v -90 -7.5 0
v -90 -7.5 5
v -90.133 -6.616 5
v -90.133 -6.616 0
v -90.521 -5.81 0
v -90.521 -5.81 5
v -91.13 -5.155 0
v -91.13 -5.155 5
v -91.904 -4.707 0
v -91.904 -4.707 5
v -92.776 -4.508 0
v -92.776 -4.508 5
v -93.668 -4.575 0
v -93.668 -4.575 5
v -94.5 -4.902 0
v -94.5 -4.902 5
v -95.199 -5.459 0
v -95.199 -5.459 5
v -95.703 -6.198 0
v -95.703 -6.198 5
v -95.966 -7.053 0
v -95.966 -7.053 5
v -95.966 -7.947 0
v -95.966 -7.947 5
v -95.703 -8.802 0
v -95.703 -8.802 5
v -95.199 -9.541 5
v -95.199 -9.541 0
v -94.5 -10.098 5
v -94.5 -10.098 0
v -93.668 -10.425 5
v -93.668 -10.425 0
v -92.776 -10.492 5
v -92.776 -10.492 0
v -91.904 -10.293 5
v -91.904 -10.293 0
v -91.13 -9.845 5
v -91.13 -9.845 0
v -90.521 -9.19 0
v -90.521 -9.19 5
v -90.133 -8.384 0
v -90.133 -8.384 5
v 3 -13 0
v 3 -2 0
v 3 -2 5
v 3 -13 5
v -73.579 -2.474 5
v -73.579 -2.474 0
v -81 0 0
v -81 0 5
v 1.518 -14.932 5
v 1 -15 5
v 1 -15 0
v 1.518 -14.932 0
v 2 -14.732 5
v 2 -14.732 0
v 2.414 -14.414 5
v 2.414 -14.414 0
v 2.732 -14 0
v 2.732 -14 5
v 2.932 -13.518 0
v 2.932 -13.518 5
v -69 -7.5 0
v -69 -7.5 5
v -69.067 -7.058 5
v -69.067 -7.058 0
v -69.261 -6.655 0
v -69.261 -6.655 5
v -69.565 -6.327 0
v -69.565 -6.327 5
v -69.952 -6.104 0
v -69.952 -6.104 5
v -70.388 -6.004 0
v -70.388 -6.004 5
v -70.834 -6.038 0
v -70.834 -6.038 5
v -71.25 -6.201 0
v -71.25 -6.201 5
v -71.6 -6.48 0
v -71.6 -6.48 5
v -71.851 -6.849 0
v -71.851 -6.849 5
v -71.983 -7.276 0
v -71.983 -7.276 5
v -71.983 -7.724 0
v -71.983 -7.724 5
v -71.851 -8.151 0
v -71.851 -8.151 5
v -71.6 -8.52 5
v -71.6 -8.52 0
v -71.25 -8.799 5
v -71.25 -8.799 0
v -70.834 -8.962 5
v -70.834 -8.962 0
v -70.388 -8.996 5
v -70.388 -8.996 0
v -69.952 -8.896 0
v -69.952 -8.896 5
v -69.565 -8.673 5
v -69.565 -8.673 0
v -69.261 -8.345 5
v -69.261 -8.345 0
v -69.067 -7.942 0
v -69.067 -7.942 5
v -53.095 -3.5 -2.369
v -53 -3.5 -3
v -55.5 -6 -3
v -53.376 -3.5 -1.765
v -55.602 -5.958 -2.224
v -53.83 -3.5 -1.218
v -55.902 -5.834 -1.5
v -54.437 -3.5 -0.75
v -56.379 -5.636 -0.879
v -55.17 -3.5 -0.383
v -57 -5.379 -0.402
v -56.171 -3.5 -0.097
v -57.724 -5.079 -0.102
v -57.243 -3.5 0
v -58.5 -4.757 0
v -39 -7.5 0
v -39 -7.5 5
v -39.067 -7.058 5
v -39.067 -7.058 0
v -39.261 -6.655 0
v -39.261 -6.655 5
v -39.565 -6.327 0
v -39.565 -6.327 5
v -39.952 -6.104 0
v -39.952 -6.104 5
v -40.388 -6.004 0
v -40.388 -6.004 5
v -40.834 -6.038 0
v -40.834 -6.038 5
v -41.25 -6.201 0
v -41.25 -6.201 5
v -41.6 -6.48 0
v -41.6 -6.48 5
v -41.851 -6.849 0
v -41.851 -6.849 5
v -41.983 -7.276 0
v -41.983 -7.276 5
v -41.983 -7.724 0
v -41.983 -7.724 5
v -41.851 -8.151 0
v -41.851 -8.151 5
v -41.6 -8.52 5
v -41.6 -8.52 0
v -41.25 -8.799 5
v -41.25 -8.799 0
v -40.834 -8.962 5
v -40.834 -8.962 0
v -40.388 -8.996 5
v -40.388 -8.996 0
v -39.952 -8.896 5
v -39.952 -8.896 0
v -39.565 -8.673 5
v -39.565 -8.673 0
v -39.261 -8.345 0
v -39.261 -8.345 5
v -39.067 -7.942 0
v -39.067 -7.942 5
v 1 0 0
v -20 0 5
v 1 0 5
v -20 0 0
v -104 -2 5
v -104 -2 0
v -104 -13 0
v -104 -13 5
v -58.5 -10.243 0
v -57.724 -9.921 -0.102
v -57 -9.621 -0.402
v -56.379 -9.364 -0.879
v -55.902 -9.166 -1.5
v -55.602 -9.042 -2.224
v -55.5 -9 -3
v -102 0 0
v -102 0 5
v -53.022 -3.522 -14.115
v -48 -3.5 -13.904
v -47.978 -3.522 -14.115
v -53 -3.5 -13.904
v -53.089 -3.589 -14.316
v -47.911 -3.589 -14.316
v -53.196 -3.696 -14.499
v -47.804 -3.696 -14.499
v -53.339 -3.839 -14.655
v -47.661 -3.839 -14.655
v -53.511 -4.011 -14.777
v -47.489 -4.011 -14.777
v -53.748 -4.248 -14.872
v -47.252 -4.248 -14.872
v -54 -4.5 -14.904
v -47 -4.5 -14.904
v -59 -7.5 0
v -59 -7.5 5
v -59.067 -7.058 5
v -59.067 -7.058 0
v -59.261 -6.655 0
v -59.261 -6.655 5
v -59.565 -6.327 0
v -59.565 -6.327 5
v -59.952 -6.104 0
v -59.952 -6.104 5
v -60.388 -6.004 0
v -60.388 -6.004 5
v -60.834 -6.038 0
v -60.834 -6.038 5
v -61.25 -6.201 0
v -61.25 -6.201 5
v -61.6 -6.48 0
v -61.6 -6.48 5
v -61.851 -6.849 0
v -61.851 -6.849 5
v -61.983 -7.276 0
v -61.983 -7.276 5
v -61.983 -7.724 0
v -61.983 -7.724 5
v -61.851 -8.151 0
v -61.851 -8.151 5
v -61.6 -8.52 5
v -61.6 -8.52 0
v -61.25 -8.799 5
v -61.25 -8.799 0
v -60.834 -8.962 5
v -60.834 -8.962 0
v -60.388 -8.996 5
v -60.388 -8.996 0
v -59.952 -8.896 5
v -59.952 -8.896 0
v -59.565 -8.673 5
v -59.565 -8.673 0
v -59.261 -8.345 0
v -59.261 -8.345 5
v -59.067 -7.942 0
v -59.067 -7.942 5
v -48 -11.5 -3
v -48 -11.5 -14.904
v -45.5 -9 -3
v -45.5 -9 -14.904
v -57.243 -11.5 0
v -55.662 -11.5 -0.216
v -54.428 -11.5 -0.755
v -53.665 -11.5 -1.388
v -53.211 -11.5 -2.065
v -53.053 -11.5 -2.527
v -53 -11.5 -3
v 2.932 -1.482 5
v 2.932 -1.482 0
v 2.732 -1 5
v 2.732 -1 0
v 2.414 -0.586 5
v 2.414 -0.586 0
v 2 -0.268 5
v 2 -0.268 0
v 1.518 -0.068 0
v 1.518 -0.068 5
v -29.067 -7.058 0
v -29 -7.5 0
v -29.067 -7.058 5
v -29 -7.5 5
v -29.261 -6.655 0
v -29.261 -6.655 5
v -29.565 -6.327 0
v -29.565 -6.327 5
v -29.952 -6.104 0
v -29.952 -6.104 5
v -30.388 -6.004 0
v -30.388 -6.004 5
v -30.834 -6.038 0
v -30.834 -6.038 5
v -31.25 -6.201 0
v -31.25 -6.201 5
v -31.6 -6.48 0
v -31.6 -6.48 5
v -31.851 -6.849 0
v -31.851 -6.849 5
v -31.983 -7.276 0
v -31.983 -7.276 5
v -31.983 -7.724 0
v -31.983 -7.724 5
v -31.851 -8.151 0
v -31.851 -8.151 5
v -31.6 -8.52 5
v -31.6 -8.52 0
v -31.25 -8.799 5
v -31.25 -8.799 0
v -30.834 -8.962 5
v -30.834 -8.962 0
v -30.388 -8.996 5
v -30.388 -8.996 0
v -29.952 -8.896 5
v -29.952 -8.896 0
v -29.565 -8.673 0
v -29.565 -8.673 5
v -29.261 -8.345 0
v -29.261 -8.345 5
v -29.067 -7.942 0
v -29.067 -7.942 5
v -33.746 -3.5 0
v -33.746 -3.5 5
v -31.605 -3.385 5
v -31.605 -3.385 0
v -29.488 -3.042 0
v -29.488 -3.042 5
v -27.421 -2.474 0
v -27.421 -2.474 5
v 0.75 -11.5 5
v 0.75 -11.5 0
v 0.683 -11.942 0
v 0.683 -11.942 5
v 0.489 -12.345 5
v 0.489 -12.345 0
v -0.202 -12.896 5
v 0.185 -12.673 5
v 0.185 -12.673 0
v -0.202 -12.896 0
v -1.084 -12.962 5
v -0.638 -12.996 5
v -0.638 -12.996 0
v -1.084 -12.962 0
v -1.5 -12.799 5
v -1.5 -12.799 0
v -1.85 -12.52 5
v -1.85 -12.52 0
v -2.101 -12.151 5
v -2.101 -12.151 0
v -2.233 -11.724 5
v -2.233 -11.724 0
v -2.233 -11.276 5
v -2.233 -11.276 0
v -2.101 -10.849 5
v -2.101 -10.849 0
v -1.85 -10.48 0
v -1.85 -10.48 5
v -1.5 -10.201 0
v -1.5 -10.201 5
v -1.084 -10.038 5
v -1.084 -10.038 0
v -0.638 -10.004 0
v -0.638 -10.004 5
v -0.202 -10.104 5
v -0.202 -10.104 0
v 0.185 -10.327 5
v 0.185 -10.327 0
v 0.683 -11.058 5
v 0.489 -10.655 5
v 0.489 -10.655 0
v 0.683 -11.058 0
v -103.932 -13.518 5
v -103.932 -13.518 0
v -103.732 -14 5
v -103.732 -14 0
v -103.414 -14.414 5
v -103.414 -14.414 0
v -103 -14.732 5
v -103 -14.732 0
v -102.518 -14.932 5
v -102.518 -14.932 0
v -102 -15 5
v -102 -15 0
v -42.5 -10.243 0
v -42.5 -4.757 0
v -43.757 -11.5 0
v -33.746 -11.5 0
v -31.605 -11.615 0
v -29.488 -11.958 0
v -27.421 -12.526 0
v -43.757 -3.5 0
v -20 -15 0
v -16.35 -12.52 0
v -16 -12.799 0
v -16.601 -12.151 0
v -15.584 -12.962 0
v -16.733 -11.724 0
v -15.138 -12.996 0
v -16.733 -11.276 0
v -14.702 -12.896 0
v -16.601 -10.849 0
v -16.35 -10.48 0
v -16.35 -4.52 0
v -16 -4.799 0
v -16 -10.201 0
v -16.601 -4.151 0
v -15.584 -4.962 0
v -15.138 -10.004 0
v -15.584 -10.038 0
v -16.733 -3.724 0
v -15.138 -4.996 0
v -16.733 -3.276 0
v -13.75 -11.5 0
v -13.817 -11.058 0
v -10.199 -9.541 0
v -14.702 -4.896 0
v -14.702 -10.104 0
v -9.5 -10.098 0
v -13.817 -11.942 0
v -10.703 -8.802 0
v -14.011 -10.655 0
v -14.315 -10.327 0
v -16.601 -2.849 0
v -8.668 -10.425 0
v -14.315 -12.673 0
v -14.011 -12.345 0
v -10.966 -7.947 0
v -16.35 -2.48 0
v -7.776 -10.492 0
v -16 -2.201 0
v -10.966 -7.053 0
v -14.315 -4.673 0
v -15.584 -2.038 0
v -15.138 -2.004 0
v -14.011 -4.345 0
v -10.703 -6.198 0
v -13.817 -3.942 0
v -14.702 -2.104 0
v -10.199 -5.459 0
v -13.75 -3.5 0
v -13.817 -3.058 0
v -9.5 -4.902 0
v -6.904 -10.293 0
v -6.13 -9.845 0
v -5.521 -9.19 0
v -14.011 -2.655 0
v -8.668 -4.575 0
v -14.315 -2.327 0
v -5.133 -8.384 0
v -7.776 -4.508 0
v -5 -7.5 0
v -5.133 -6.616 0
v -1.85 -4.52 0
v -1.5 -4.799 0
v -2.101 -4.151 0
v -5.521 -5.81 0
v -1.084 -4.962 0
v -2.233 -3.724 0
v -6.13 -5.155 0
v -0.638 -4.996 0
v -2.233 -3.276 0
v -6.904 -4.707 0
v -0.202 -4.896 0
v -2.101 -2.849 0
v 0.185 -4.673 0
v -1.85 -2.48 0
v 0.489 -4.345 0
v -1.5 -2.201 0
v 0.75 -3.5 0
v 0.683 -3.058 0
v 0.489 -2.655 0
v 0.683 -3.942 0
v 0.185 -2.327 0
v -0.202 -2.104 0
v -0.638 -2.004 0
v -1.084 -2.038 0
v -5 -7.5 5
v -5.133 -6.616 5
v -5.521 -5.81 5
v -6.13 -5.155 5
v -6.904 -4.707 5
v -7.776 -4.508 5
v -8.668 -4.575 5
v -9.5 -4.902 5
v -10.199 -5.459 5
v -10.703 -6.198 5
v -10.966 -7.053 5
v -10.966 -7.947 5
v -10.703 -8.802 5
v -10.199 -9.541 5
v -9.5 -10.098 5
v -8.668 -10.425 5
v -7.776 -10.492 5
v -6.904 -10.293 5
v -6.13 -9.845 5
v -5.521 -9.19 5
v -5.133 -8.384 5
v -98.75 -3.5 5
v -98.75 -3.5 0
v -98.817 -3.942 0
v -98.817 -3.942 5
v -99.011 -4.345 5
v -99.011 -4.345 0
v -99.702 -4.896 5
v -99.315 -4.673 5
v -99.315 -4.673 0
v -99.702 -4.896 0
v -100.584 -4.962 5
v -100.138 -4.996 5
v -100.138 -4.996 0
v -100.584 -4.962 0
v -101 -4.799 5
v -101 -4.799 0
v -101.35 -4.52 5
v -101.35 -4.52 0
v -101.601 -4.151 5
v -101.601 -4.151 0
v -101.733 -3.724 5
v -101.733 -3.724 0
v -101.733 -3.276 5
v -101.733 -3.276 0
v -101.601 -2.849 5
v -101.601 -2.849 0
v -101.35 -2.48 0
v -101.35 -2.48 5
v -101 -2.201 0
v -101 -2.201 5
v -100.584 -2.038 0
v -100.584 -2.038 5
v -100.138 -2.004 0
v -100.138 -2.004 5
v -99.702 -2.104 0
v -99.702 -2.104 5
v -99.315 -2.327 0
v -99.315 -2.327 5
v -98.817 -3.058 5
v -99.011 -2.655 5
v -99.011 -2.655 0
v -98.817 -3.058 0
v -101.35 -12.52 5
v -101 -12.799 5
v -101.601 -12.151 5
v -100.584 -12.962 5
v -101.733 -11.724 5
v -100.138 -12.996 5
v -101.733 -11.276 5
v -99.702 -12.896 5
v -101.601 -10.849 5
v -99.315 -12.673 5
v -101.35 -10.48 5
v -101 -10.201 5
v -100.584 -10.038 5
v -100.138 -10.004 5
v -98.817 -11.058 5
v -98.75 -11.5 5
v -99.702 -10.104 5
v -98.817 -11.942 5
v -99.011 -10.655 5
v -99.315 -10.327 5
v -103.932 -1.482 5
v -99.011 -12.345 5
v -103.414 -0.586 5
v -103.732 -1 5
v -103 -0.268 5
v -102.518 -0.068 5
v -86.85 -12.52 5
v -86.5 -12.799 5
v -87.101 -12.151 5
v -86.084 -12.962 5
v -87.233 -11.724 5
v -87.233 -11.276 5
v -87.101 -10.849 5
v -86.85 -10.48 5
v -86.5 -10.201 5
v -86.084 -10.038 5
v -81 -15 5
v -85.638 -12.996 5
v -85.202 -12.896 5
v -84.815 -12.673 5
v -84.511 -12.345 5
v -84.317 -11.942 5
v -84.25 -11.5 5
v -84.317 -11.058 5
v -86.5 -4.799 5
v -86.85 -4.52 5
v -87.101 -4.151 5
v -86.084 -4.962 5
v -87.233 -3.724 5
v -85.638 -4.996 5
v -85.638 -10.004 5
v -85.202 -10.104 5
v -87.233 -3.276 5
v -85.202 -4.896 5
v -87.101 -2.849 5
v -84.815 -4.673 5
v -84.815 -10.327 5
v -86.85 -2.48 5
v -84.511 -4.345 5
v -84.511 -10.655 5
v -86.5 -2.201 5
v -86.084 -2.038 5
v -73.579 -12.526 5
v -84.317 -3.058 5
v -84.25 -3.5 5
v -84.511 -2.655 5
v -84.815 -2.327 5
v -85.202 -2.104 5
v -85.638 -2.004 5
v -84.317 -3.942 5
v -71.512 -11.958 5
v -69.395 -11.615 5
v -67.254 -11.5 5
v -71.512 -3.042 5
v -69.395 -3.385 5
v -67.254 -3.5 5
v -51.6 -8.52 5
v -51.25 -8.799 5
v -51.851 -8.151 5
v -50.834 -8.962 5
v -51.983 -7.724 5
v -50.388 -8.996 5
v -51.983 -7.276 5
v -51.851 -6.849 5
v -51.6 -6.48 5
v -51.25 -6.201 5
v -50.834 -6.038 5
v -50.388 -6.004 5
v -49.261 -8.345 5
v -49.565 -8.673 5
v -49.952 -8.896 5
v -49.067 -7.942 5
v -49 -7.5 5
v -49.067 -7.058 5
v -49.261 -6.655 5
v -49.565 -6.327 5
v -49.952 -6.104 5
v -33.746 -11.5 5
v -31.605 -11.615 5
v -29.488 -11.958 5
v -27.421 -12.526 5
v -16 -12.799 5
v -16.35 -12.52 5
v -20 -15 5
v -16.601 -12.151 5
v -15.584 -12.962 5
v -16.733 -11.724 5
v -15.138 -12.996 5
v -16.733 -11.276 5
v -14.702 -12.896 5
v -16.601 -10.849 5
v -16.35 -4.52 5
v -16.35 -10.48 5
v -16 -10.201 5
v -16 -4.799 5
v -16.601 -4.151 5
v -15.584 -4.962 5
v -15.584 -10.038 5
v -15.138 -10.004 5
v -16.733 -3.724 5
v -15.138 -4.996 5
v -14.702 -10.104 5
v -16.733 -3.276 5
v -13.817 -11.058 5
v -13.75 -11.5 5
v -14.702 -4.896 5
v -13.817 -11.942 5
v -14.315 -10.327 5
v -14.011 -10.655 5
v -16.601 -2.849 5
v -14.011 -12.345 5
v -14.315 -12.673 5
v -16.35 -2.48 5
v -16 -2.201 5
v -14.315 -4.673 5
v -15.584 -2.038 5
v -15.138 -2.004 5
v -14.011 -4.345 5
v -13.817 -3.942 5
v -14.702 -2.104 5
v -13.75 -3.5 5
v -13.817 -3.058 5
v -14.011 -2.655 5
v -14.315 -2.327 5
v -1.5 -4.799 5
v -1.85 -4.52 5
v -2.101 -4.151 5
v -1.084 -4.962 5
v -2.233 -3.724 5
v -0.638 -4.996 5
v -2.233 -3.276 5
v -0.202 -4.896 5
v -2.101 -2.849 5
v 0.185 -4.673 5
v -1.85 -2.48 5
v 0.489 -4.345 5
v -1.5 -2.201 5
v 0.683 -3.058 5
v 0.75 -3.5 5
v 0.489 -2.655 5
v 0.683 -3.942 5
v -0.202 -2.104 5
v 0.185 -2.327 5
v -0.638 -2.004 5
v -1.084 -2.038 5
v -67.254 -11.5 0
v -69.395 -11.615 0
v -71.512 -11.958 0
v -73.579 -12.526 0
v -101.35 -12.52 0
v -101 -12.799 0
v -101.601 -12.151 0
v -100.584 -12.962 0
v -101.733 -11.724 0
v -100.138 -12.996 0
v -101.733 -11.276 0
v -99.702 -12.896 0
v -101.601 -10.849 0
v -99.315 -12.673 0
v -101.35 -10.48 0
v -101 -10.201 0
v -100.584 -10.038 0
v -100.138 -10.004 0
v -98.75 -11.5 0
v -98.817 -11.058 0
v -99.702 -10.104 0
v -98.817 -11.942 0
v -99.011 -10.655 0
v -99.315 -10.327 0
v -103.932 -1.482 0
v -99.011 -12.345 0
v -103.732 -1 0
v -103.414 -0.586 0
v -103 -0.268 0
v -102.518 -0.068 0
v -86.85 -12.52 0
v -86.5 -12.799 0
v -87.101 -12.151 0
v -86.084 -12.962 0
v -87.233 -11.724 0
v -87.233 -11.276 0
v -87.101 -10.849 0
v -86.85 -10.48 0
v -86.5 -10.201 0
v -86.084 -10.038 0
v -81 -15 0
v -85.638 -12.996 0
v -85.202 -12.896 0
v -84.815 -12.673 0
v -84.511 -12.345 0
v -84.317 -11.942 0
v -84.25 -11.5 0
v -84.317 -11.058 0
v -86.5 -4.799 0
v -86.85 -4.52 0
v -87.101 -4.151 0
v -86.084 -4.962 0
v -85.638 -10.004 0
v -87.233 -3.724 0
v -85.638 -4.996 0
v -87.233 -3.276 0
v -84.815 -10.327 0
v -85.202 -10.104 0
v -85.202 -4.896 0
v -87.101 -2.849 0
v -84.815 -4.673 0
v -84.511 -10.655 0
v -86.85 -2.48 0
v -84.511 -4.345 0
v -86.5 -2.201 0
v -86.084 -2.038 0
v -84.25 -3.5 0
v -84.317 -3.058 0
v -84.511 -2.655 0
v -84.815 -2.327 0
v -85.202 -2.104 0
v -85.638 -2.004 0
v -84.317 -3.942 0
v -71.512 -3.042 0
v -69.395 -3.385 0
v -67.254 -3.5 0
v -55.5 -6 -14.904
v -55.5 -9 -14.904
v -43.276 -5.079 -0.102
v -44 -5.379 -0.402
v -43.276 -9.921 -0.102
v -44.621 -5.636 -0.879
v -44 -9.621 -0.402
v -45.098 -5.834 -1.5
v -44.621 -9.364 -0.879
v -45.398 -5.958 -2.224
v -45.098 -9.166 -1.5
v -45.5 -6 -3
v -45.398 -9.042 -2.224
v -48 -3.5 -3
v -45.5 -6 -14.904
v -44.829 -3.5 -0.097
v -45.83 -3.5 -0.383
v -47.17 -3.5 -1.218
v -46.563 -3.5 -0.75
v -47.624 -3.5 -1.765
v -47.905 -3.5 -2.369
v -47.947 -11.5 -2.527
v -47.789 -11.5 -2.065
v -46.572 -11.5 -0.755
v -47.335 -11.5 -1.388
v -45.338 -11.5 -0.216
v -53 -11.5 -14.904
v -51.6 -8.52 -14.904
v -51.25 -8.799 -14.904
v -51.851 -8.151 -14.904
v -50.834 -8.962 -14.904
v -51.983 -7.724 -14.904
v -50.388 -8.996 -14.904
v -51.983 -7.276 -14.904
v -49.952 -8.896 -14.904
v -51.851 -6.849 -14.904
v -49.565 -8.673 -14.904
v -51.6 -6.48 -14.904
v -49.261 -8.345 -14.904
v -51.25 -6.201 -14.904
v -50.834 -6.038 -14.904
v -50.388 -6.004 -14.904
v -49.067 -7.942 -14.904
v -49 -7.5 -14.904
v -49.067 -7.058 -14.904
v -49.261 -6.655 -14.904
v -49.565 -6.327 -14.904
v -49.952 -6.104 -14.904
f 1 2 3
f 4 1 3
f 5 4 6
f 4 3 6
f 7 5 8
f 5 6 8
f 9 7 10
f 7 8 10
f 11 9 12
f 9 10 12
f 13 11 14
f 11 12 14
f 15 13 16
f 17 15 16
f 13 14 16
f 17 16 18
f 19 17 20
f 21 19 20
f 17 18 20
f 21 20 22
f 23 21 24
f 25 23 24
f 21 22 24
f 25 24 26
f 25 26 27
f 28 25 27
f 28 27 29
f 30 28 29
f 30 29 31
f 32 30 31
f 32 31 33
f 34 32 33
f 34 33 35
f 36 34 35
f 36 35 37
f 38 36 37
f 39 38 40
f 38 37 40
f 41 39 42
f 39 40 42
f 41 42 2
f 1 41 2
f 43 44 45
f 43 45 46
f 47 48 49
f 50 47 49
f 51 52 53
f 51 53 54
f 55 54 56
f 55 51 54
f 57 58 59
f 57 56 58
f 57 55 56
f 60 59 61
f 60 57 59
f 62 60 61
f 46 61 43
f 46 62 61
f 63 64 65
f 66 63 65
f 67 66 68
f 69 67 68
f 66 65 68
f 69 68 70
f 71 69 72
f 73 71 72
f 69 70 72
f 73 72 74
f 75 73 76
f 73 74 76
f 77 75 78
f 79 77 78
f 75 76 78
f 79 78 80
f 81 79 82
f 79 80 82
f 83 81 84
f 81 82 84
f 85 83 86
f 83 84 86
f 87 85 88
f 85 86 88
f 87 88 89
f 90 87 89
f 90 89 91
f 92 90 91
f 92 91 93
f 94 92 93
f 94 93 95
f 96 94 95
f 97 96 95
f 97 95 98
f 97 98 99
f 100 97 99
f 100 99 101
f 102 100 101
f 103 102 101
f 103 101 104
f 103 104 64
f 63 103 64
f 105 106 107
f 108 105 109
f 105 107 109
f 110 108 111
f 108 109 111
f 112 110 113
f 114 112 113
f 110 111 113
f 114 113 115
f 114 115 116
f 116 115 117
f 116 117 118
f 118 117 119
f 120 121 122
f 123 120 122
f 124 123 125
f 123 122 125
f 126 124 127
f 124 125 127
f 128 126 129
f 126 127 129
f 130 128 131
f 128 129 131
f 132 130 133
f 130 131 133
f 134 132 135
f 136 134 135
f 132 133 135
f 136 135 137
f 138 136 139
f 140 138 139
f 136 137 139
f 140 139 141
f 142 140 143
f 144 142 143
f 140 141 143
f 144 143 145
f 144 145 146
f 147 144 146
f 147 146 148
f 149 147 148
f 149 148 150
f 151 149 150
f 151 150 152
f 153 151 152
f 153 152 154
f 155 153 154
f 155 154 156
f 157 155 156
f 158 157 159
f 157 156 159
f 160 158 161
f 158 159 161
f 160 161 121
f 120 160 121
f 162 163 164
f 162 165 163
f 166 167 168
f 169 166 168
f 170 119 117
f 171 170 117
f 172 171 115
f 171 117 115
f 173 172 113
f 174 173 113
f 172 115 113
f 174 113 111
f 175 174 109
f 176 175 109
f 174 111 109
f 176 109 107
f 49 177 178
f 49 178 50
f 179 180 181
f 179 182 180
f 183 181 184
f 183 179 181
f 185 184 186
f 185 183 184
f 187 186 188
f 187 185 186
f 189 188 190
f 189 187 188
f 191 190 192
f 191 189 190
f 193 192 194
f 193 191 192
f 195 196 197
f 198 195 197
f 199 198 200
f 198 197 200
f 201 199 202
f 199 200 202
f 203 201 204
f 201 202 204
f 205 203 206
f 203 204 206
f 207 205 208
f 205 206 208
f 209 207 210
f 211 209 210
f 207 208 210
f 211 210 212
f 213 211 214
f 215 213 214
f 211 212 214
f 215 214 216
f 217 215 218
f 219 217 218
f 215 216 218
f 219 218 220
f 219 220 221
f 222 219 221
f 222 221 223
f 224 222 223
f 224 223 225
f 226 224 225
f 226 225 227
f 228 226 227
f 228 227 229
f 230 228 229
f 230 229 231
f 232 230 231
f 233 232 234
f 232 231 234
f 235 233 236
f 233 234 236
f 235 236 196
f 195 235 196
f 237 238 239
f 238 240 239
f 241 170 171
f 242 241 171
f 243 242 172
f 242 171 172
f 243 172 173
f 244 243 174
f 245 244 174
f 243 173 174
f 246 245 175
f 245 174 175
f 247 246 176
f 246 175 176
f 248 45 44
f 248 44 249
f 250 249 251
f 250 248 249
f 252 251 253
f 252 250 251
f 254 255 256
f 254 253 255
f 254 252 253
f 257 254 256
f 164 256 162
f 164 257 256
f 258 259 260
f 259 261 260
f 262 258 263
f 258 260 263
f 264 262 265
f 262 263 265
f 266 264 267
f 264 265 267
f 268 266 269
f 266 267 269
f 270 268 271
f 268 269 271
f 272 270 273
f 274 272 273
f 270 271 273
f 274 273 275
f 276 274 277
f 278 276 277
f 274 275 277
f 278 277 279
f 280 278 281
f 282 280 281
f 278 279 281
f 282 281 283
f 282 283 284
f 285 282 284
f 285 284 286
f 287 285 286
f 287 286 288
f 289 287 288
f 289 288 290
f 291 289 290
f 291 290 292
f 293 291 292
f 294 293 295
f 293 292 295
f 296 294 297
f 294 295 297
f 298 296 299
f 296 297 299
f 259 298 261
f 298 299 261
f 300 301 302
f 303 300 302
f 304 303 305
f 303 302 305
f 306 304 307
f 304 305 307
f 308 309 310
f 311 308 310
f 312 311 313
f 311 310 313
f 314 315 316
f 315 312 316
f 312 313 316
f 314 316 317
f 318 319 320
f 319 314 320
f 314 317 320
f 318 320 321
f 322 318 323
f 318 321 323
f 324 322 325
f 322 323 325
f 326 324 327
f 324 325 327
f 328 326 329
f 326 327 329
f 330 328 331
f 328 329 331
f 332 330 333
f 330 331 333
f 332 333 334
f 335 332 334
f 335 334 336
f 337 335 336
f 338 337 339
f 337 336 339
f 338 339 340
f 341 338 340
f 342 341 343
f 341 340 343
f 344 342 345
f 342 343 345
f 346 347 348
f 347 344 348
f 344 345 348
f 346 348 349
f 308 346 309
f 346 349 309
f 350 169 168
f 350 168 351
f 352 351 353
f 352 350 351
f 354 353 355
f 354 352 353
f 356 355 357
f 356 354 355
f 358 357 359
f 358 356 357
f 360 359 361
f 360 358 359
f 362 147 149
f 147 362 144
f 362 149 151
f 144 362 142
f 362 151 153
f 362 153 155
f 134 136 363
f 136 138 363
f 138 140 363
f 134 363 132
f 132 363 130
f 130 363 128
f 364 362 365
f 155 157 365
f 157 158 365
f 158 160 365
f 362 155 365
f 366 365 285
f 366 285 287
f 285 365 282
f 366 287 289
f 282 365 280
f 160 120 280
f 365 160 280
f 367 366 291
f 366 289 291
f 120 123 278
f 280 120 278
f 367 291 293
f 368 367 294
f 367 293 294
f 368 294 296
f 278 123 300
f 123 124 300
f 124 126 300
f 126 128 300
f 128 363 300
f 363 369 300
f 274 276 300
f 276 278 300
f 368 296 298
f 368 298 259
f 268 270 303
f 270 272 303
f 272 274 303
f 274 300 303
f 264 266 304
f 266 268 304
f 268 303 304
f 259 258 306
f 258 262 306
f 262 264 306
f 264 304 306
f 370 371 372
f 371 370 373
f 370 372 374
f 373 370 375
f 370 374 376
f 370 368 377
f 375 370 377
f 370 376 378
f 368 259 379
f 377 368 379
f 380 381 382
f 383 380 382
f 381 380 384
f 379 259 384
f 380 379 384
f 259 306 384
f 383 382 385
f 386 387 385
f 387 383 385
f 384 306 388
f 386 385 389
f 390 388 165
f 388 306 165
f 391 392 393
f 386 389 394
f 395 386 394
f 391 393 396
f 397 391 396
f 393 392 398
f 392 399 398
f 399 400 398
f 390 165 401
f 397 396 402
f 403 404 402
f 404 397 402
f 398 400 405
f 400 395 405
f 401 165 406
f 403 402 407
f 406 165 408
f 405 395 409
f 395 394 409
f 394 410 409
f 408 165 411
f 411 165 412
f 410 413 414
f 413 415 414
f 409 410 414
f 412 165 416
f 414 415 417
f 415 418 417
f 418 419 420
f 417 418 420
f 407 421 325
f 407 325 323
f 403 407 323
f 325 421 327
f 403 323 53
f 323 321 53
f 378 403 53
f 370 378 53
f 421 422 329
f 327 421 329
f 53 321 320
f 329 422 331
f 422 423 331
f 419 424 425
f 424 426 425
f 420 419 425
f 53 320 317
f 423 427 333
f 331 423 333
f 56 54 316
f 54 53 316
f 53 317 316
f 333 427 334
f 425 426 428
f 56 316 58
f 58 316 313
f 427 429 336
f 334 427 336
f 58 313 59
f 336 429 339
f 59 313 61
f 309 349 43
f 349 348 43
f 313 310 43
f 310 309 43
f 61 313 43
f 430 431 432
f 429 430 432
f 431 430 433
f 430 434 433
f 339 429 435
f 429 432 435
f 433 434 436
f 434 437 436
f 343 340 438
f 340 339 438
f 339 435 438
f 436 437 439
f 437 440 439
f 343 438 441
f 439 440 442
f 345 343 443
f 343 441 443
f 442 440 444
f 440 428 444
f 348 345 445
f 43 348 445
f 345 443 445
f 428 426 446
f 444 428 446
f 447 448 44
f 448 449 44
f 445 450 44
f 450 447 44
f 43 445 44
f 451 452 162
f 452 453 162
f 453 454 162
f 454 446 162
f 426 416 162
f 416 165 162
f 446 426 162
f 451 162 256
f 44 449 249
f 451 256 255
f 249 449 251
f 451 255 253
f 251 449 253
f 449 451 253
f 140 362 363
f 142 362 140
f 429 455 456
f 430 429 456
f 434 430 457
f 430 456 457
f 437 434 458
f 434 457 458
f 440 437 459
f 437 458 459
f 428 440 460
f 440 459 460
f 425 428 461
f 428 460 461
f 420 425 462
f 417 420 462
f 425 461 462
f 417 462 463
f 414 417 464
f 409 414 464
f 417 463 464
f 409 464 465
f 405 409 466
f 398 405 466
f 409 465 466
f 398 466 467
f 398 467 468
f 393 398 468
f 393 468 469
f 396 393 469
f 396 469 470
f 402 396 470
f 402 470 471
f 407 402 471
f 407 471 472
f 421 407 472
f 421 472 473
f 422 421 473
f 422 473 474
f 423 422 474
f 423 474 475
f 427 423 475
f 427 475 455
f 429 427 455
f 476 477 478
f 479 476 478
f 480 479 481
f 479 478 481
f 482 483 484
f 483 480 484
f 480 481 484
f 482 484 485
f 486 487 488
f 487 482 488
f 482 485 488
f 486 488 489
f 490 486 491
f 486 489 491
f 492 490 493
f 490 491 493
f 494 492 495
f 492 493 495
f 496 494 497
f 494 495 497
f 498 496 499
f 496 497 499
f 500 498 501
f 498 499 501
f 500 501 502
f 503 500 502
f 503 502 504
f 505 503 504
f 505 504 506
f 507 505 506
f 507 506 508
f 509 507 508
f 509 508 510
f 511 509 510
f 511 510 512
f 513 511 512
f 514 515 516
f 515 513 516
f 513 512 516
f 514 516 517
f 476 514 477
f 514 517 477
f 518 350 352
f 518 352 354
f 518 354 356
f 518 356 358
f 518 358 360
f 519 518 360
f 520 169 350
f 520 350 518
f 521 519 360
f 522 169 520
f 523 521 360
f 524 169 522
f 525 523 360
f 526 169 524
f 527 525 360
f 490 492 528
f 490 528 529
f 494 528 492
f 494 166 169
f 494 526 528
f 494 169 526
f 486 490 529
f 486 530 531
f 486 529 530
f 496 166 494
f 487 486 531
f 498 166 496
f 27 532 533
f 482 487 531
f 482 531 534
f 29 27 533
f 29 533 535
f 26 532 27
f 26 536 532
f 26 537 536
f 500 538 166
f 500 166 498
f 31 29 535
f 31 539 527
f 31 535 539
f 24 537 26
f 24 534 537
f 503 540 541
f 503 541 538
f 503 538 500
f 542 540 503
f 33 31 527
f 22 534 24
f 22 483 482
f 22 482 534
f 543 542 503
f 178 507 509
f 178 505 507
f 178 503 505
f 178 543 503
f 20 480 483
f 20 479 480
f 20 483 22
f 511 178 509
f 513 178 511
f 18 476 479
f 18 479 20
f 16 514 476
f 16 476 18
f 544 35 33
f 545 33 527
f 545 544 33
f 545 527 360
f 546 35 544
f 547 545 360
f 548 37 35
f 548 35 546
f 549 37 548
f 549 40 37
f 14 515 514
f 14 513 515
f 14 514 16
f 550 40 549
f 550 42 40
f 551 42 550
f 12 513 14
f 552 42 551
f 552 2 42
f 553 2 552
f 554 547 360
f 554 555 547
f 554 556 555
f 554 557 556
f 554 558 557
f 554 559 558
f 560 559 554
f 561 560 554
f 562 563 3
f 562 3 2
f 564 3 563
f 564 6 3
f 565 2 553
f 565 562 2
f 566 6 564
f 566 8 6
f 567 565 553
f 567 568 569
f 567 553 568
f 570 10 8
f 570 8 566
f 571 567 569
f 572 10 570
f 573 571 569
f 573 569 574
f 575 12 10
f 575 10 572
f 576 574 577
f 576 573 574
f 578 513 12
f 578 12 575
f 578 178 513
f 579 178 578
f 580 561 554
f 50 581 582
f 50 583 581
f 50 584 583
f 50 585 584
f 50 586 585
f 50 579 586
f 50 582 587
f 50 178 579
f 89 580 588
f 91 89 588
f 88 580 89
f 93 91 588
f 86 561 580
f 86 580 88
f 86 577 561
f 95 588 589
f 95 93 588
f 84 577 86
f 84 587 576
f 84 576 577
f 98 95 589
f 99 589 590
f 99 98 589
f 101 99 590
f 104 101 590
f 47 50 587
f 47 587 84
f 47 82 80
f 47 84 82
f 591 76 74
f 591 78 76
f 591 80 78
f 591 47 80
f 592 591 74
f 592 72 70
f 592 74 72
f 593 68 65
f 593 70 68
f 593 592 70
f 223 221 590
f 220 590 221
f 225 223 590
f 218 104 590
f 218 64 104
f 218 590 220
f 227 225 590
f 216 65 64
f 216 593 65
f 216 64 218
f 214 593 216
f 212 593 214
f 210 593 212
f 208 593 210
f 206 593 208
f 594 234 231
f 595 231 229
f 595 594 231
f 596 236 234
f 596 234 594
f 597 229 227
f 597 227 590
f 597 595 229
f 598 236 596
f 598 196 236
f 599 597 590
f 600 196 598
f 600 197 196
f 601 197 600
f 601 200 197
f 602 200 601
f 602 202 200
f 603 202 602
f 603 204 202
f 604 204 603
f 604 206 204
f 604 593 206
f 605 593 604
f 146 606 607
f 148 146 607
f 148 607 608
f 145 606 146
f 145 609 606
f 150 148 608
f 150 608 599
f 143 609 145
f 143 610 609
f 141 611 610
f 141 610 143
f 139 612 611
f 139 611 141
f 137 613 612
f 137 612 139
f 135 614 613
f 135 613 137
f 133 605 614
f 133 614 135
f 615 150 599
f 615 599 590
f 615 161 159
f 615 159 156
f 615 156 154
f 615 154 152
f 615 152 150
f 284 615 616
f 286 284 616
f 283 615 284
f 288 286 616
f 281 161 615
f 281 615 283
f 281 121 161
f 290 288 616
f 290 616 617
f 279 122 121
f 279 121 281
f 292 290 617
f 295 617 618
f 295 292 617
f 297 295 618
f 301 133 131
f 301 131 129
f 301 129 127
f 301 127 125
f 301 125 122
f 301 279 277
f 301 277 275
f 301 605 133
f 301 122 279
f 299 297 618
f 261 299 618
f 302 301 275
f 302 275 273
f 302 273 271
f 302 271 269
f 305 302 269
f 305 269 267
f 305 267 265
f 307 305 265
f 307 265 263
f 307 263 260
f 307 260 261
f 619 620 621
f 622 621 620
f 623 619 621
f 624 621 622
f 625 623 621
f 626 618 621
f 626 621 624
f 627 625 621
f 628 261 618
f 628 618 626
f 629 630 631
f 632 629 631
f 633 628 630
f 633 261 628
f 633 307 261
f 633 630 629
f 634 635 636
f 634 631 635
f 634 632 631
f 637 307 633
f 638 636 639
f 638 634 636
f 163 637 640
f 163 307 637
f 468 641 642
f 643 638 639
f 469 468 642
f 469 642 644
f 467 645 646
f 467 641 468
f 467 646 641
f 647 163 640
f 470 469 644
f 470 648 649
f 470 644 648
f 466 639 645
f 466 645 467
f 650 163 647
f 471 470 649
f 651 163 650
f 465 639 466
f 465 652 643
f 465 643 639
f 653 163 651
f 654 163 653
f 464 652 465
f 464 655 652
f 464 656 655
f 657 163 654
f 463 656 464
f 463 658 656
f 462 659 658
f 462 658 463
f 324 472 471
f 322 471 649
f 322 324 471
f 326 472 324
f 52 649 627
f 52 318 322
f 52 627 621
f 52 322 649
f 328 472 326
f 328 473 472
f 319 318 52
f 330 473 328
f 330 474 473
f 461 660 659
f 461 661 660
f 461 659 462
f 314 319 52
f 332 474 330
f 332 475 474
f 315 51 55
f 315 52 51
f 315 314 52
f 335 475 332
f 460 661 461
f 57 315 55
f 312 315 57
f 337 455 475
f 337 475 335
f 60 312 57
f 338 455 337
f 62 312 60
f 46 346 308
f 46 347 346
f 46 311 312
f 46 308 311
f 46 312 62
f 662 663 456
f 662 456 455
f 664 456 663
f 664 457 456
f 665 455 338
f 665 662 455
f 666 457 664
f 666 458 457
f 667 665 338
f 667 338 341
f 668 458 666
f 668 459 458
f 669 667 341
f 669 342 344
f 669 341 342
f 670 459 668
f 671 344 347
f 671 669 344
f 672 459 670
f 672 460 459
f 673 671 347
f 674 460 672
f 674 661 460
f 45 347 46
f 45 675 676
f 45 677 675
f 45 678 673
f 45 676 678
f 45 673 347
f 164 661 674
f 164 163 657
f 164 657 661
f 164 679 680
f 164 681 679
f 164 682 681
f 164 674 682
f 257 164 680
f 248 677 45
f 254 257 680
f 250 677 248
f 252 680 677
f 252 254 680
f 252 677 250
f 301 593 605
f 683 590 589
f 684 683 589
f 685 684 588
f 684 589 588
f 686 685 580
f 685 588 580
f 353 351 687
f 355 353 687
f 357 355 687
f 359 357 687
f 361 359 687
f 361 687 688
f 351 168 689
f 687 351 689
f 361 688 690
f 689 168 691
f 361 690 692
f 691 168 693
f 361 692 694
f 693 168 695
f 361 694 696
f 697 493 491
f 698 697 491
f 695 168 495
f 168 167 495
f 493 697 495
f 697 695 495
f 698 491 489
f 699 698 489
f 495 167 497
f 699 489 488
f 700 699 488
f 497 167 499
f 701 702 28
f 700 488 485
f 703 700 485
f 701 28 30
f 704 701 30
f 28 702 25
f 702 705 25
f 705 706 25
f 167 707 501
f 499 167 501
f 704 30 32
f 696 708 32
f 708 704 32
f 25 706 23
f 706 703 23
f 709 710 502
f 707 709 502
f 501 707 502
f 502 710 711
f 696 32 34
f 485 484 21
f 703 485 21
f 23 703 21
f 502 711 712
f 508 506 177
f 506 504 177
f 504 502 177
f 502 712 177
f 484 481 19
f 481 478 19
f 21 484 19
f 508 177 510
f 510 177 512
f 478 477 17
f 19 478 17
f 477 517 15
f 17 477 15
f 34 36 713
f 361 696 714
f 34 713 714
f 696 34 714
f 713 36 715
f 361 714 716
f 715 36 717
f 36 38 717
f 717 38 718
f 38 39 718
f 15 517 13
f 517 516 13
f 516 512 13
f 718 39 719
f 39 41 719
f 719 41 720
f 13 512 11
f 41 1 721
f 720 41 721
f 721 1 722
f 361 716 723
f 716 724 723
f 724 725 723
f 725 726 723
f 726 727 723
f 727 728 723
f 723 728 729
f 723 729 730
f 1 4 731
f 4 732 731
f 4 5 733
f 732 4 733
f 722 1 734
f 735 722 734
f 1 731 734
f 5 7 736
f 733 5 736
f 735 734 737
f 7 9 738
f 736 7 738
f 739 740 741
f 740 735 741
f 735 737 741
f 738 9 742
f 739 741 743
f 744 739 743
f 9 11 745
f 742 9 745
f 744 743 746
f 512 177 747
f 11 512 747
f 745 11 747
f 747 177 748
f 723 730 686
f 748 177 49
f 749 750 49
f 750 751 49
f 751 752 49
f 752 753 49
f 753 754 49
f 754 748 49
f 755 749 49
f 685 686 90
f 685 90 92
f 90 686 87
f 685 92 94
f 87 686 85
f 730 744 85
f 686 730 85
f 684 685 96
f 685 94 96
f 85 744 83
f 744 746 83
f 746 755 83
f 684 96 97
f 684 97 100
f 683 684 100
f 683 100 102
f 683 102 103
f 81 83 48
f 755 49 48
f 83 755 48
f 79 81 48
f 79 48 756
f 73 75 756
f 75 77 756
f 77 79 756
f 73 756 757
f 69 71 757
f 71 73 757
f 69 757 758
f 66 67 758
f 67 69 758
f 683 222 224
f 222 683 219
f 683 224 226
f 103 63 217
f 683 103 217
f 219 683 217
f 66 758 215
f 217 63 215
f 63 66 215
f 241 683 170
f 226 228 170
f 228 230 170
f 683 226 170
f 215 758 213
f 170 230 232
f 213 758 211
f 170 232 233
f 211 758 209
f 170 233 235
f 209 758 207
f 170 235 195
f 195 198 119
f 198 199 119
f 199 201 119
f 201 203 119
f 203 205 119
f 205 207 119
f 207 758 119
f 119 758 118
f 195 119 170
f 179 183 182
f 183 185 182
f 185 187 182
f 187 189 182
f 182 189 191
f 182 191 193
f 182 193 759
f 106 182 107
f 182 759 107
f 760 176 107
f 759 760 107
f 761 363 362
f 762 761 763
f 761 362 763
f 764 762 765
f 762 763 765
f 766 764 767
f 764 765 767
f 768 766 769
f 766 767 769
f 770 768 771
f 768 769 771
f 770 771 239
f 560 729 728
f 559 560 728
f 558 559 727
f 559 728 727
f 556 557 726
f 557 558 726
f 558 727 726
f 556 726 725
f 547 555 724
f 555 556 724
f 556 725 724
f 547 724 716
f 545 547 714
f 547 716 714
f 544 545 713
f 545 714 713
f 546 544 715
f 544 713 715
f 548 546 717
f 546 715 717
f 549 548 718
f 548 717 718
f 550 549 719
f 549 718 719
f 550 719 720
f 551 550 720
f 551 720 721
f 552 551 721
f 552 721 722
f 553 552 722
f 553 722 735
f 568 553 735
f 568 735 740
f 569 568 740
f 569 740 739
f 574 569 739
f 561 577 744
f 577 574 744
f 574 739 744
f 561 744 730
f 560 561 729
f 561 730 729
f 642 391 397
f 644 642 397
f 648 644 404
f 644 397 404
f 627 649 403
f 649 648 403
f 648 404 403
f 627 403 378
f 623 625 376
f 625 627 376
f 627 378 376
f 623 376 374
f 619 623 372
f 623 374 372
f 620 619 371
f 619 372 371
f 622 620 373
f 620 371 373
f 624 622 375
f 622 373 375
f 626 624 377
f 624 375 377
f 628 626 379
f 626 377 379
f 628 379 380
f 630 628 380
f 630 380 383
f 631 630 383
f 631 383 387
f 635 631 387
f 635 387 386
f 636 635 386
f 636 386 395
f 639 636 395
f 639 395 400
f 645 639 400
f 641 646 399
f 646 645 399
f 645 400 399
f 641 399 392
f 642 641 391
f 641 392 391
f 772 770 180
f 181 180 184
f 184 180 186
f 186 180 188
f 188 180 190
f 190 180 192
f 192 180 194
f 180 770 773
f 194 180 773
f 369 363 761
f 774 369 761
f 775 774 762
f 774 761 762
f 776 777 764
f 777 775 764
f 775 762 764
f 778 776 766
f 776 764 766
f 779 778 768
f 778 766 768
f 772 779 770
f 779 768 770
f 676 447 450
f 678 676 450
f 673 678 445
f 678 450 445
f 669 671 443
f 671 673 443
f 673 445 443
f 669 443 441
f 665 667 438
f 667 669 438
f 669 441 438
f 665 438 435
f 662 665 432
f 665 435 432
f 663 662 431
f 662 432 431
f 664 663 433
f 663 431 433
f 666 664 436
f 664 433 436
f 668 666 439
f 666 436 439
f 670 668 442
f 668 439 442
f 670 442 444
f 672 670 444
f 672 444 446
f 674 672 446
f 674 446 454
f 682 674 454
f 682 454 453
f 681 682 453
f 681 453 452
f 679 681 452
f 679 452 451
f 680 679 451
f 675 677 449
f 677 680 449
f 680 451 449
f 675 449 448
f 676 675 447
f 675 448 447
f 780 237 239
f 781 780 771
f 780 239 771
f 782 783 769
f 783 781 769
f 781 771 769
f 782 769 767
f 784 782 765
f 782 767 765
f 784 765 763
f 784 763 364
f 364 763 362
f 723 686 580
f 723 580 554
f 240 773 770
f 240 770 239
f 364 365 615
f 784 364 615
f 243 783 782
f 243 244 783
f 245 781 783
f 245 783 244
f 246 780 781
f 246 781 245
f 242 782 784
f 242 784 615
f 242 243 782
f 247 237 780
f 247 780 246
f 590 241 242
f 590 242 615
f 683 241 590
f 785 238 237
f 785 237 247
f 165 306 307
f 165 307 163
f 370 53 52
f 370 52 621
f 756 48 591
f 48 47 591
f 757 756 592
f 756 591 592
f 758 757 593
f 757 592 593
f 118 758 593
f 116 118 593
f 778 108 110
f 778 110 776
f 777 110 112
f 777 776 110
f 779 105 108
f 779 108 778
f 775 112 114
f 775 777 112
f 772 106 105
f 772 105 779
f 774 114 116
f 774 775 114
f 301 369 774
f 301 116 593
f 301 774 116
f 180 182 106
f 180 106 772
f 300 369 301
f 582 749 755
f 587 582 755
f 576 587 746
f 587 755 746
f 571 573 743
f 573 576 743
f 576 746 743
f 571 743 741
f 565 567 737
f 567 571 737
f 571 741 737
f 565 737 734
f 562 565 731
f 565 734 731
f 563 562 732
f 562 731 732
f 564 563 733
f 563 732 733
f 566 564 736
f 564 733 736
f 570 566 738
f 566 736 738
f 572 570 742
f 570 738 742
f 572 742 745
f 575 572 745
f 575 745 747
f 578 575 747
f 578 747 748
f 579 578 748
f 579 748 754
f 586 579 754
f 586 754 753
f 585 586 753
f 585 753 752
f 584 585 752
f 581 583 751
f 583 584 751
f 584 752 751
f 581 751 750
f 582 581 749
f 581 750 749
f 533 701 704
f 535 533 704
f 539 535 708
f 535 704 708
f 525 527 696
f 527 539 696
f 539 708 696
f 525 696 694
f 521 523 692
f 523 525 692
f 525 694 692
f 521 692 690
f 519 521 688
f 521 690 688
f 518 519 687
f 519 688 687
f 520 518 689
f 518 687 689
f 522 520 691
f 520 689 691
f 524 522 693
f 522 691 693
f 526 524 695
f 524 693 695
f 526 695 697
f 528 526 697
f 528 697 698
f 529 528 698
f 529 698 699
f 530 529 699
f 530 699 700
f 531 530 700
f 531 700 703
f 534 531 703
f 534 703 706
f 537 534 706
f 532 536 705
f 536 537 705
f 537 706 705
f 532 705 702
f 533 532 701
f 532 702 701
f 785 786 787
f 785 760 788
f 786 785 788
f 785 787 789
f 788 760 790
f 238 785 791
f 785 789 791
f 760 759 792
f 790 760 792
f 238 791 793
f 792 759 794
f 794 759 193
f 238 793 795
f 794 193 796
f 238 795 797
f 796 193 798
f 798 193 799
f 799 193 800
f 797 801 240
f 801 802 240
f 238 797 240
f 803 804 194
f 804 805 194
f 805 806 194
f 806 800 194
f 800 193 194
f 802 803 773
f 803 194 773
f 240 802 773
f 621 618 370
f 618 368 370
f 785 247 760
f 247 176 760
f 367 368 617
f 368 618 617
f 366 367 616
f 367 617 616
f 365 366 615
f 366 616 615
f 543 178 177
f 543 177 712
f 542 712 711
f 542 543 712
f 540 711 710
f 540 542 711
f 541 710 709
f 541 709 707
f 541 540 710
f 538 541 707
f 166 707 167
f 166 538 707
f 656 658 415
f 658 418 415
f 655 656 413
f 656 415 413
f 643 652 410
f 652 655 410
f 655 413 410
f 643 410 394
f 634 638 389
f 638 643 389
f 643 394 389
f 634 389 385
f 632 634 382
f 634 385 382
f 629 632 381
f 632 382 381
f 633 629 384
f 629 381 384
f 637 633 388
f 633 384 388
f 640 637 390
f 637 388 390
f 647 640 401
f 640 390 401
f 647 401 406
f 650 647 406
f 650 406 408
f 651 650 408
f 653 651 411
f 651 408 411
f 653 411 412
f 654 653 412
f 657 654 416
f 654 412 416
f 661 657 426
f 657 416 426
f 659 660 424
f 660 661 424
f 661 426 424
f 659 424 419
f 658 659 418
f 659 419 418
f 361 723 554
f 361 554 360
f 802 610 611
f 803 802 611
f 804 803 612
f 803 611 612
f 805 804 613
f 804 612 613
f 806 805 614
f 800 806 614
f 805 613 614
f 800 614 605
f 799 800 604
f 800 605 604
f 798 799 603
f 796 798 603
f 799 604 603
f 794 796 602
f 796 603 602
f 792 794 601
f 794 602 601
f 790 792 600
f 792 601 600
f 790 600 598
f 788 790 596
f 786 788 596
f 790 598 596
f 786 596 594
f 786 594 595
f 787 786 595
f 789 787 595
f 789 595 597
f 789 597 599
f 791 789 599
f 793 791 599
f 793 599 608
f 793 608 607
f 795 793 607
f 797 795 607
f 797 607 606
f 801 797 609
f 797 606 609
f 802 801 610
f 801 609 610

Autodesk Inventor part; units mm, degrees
ref_plane "YZ Plane" through (0, 0, 0) normal (1, 0, 0) x (0, 1, 0)
ref_plane "XZ Plane" through (0, 0, 0) normal (0, 1, 0) x (-1, 0, 0)
sketch "Sketch1" plane through (0, 0, 0) normal (0, 0, 1) x (1, 0, 0)
  circle A0 centre (-100.25, -3.5) radius 1.5 projected
  circle A1 centre (-100.25, -11.5) radius 1.5 projected
  line L0 (-104, 0) -> (-96.5, 0) projected
  line L1 (-104, 0) -> (-104, -15) projected
  line L2 (-96.5, -15) -> (-104, -15) projected
  line L3 (-96.5, 0) -> (-96.5, -15) projected
  circle A2 centre (-85.75, -3.5) radius 1.5 projected
  circle A3 centre (-85.75, -11.5) radius 1.5 projected
  line L4 (-90.5, 0) -> (-81, 0) projected
  line L5 (-90.5, 0) -> (-90.5, -15) projected
  line L6 (-81, -15) -> (-90.5, -15) projected
  line L7 (-81, 0) -> (-81, -15) projected
  circle A4 centre (-15.25, -11.5) radius 1.5 projected
  circle A5 centre (-15.25, -3.5) radius 1.5 projected
  line L8 (-20, 0) -> (-10.5, 0) projected
  line L9 (-20, 0) -> (-20, -15) projected
  line L10 (-10.5, -15) -> (-20, -15) projected
  line L11 (-10.5, 0) -> (-10.5, -15) projected
  circle A6 centre (-0.75, -3.5) radius 1.5 projected
  circle A7 centre (-0.75, -11.5) radius 1.5 projected
  line L12 (-4.5, 0) -> (3, 0) projected
  line L13 (-4.5, 0) -> (-4.5, -15) projected
  line L14 (3, -15) -> (-4.5, -15) projected
  line L15 (3, 0) -> (3, -15) projected
  line L16 (-104, -15) -> (3, -15)
  line L17 (3, -15) -> (3, 0)
  line L18 (3, 0) -> (-104, 0)
  line L19 (-104, 0) -> (-104, -15)
  line L20 (-50.5, -15) -> (-50.5, 0)
  line L21 (-70.5, -11.5) -> (-70.5, -3.5)
  line L22 (-70.5, -3.5) -> (-30.5, -3.5)
  line L23 (-30.5, -3.5) -> (-30.5, -11.5)
  line L24 (-30.5, -11.5) -> (-70.5, -11.5)
  line L25 (-70.5, -11.5) -> (-30.5, -3.5) construction
  line L26 (-70.5, -3.5) -> (-30.5, -11.5) construction
  line L27 (-70.5, -3.5) -> (-81, 0)
  line L28 (-30.5, -3.5) -> (-20, 0)
  line L29 (-30.5, -11.5) -> (-20, -15)
  line L30 (-70.5, -11.5) -> (-81, -15)
  point P0 (0, 0)
  point P1 (-50.5, -7.5)
  dimension "d0" = 8
  dimension "d1" = 40
extrude "Extrusion1" add sketch "Sketch1" along normal blind 5 contours L0 L3 L2 L1 | L18 L5 L16 L3 | L4 L7 L6 L5 | L27 L21 L30 L7 | L22 L20 L24 L21 | L8 L11 L10 L9 | L9 L29 L23 L28 | L22 L23 L24 L20 | L18 L13 L16 L11 | L12 L15 L14 L13
sketch "Sketch2" plane through (0, 0, 5) normal (0, 0, 1) x (1, 0, 0)
  line L0 (-81, 0) -> (-104, 0) projected
  line L1 (-104, 0) -> (-104, -15) projected
  line L2 (-104, -15) -> (-81, -15) projected
  line L3 (-81, -15) -> (-70.5, -11.5) projected
  line L4 (-70.5, -11.5) -> (-30.5, -11.5) projected
  line L5 (-30.5, -11.5) -> (-20, -15) projected
  line L6 (-20, -15) -> (3, -15) projected
  line L7 (3, -15) -> (3, 0) projected
  line L8 (3, 0) -> (-20, 0) projected
  line L9 (-20, 0) -> (-30.5, -3.5) projected
  line L10 (-30.5, -3.5) -> (-70.5, -3.5) projected
  line L11 (-70.5, -3.5) -> (-81, 0) projected
  circle A0 centre (-100.25, -3.5) radius 1.5 projected
  circle A1 centre (-100.25, -11.5) radius 1.5 projected
  circle A2 centre (-85.75, -3.5) radius 1.5 projected
  circle A3 centre (-85.75, -11.5) radius 1.5 projected
  circle A4 centre (-15.25, -11.5) radius 1.5 projected
  circle A5 centre (-15.25, -3.5) radius 1.5 projected
  circle A6 centre (-0.75, -3.5) radius 1.5 projected
  circle A7 centre (-0.75, -11.5) radius 1.5 projected
  line L12 (-70.5, -11.5) -> (-30.5, -11.5) projected
  line L13 (-50.5, -11.5) -> (-50.5, -3.5)
  line L14 (-30.5, -3.5) -> (-70.5, -3.5) projected
  line L15 (-50.5, -7.5) -> (-60.5, -7.5)
  line L16 (-60.5, -7.5) -> (-70.5, -7.5)
  line L17 (-50.5, -7.5) -> (-40.5, -7.5)
  line L18 (-40.5, -7.5) -> (-30.5, -7.5)
  circle A8 centre (-70.5, -7.5) radius 1.5
  circle A9 centre (-60.5, -7.5) radius 1.5
  circle A10 centre (-50.5, -7.5) radius 1.5
  circle A11 centre (-40.5, -7.5) radius 1.5
  circle A12 centre (-30.5, -7.5) radius 1.5
  point P0 (0, 0)
  dimension "d4" = 10
  dimension "d5" = 10
  dimension "d6" = 10
  dimension "d7" = 10
  dimension "d8" = 3
  dimension "d9" = 3
  dimension "d10" = 3
  dimension "d11" = 3
  dimension "d12" = 3
extrude "Extrusion2" cut sketch "Sketch2" against normal blind 5 contours A8 | A9 L16 L15 | L15 L16 A9 | A12 | A11 L18 L17 | L17 L18 A11 | A10 L17 L13 | L13 L15 A10 | L17 A10 L13 | L13 A10 L15
fillet "Fillet1" radius 2 4 edges at (-104, 0, 2.5) (-104, -15, 2.5) (3, -15, 2.5) (3, 0, 2.5)
sketch "Sketch3" plane through (0, 0, 5) normal (0, 0, 1) x (1, 0, 0)
  arc A0 (3, -2) -> (1, 0) centre (1, -2) ccw projected
  line L0 (1, 0) -> (-20, 0) projected
  line L1 (-20, 0) -> (-30.5, -3.5) projected
  line L2 (-30.5, -3.5) -> (-70.5, -3.5) projected
  line L3 (-70.5, -3.5) -> (-81, 0) projected
  line L4 (-81, 0) -> (-102, 0) projected
  arc A1 (-102, 0) -> (-104, -2) centre (-102, -2) ccw projected
  line L5 (-104, -2) -> (-104, -13) projected
  arc A2 (-104, -13) -> (-102, -15) centre (-102, -13) ccw projected
  line L6 (-102, -15) -> (-81, -15) projected
  line L7 (-81, -15) -> (-70.5, -11.5) projected
  line L8 (-70.5, -11.5) -> (-30.5, -11.5) projected
  line L9 (-30.5, -11.5) -> (-20, -15) projected
  line L10 (-20, -15) -> (1, -15) projected
  arc A3 (1, -15) -> (3, -13) centre (1, -13) ccw projected
  line L11 (3, -13) -> (3, -2) projected
  circle A4 centre (-50.5, -7.5) radius 1.5 projected
  circle A5 centre (-40.5, -7.5) radius 1.5 projected
  circle A6 centre (-60.5, -7.5) radius 1.5 projected
  circle A7 centre (-30.5, -7.5) radius 1.5 projected
  circle A8 centre (-70.5, -7.5) radius 1.5 projected
  circle A9 centre (-100.25, -3.5) radius 1.5 projected
  circle A10 centre (-100.25, -11.5) radius 1.5 projected
  circle A11 centre (-85.75, -3.5) radius 1.5 projected
  circle A12 centre (-85.75, -11.5) radius 1.5 projected
  circle A13 centre (-15.25, -11.5) radius 1.5 projected
  circle A14 centre (-15.25, -3.5) radius 1.5 projected
  circle A15 centre (-0.75, -3.5) radius 1.5 projected
  circle A16 centre (-0.75, -11.5) radius 1.5 projected
  line L12 (-55.5, -11.5) -> (-55.5, -3.5)
  line L13 (-55.5, -3.5) -> (-45.5, -3.5)
  line L14 (-45.5, -3.5) -> (-45.5, -11.5)
  line L15 (-45.5, -11.5) -> (-55.5, -11.5)
  circle A17 centre (-50.5, -7.5) radius 1.5 projected
  line L16 (-55.5, -11.5) -> (-45.5, -3.5) construction
  line L17 (-55.5, -3.5) -> (-45.5, -11.5) construction
  point P0 (0, 0)
  dimension "d16" = 8
  dimension "d17" = 10
ref_plane "Work Plane1" through (-77, -15, -14.9044) normal (0, 0, 1) x (1, 0, 0)
extrude "Extrusion3" add sketch "Sketch3" against normal up to surface (19.9044 mm away) contours L14 L8 L12 L2
chamfer "Chamfer1" distance 2.5 angle 45 4 edges at (-45.5, -3.5, -7.4522) (-55.5, -3.5, -7.4522) (-45.5, -11.5, -7.4522) (-55.5, -11.5, -7.4522)
fillet "Fillet2" radius 3 6 edges at (-54.25, -10.25, 0) (-55.5, -7.5, 0) (-54.25, -4.75, 0) (-46.75, -10.25, 0) (-45.5, -7.5, 0) (-46.75, -4.75, 0)
fillet "Fillet3" radius 1 1 edges at (-50.5, -3.5, -14.9044)
fillet "Fillet4" radius 20 4 edges at (-70.5, -3.5, 2.5) (-30.5, -3.5, 2.5) (-70.5, -11.5, 2.5) (-30.5, -11.5, 2.5)
sketch "Sketch4" plane through (0, 0, 5) normal (0, 0, 1) x (1, 0, 0)
  circle A0 centre (-0.75, -11.5) radius 1.5 projected
  circle A1 centre (-0.75, -3.5) radius 1.5 projected
  circle A2 centre (-15.25, -3.5) radius 1.5 projected
  circle A3 centre (-15.25, -11.5) radius 1.5 projected
  circle A4 centre (-30.5, -7.5) radius 1.5 projected
  circle A5 centre (-40.5, -7.5) radius 1.5 projected
  circle A6 centre (-50.5, -7.5) radius 1.5 projected
  line L0 (-33.7456, -3.5) -> (-67.2544, -3.5) projected
  arc A7 (-73.579, -2.4737) -> (-67.2544, -3.5) centre (-67.2544, 16.5) ccw projected
  line L1 (-73.579, -2.4737) -> (-81, 0) projected
  line L2 (-81, 0) -> (-102, 0) projected
  arc A8 (-102, 0) -> (-104, -2) centre (-102, -2) ccw projected
  line L3 (-104, -2) -> (-104, -13) projected
  arc A9 (-104, -13) -> (-102, -15) centre (-102, -13) ccw projected
  line L4 (-102, -15) -> (-81, -15) projected
  line L5 (-81, -15) -> (-73.579, -12.5263) projected
  arc A10 (-67.2544, -11.5) -> (-73.579, -12.5263) centre (-67.2544, -31.5) ccw projected
  line L6 (-67.2544, -11.5) -> (-33.7456, -11.5) projected
  arc A11 (-27.421, -12.5263) -> (-33.7456, -11.5) centre (-33.7456, -31.5) ccw projected
  line L7 (-27.421, -12.5263) -> (-20, -15) projected
  line L8 (-20, -15) -> (1, -15) projected
  arc A12 (1, -15) -> (3, -13) centre (1, -13) ccw projected
  line L9 (3, -13) -> (3, -2) projected
  arc A13 (3, -2) -> (1, 0) centre (1, -2) ccw projected
  line L10 (1, 0) -> (-20, 0) projected
  line L11 (-20, 0) -> (-27.421, -2.4737) projected
  arc A14 (-33.7456, -3.5) -> (-27.421, -2.4737) centre (-33.7456, 16.5) ccw projected
  circle A15 centre (-60.5, -7.5) radius 1.5 projected
  circle A16 centre (-70.5, -7.5) radius 1.5 projected
  circle A17 centre (-100.25, -3.5) radius 1.5 projected
  circle A18 centre (-100.25, -11.5) radius 1.5 projected
  circle A19 centre (-85.75, -3.5) radius 1.5 projected
  circle A20 centre (-85.75, -11.5) radius 1.5 projected
  line L12 (-100.25, -3.5) -> (-85.75, -11.5)
  circle A21 centre (-85.75, -3.5) radius 1.5 projected
  line L13 (-85.75, -11.5) -> (-85.75, -3.5)
  circle A22 centre (-100.25, -11.5) radius 1.5 projected
  line L14 (-85.75, -3.5) -> (-100.25, -11.5)
  circle A23 centre (-15.25, -11.5) radius 1.5 projected
  line L15 (-0.75, -3.5) -> (-15.25, -11.5)
  line L16 (-15.25, -11.5) -> (-15.25, -3.5)
  circle A24 centre (-0.75, -11.5) radius 1.5 projected
  line L17 (-15.25, -3.5) -> (-0.75, -11.5)
  circle A25 centre (-93, -7.5) radius 3
  circle A26 centre (-8, -7.5) radius 3
  point P0 (0, 0)
  dimension "d26" = 6
  dimension "d27" = 6
extrude "Extrusion4" cut sketch "Sketch4" against normal blind 5 contours A26 L15 L17 | L17 L15 A26 | L17 A26 L15 | L15 A26 L17 | A25 L14 L12 | L12 L14 A25 | L14 A25 L12 | L12 A25 L14
properties part number "carbon_fiber_fixer_1"
